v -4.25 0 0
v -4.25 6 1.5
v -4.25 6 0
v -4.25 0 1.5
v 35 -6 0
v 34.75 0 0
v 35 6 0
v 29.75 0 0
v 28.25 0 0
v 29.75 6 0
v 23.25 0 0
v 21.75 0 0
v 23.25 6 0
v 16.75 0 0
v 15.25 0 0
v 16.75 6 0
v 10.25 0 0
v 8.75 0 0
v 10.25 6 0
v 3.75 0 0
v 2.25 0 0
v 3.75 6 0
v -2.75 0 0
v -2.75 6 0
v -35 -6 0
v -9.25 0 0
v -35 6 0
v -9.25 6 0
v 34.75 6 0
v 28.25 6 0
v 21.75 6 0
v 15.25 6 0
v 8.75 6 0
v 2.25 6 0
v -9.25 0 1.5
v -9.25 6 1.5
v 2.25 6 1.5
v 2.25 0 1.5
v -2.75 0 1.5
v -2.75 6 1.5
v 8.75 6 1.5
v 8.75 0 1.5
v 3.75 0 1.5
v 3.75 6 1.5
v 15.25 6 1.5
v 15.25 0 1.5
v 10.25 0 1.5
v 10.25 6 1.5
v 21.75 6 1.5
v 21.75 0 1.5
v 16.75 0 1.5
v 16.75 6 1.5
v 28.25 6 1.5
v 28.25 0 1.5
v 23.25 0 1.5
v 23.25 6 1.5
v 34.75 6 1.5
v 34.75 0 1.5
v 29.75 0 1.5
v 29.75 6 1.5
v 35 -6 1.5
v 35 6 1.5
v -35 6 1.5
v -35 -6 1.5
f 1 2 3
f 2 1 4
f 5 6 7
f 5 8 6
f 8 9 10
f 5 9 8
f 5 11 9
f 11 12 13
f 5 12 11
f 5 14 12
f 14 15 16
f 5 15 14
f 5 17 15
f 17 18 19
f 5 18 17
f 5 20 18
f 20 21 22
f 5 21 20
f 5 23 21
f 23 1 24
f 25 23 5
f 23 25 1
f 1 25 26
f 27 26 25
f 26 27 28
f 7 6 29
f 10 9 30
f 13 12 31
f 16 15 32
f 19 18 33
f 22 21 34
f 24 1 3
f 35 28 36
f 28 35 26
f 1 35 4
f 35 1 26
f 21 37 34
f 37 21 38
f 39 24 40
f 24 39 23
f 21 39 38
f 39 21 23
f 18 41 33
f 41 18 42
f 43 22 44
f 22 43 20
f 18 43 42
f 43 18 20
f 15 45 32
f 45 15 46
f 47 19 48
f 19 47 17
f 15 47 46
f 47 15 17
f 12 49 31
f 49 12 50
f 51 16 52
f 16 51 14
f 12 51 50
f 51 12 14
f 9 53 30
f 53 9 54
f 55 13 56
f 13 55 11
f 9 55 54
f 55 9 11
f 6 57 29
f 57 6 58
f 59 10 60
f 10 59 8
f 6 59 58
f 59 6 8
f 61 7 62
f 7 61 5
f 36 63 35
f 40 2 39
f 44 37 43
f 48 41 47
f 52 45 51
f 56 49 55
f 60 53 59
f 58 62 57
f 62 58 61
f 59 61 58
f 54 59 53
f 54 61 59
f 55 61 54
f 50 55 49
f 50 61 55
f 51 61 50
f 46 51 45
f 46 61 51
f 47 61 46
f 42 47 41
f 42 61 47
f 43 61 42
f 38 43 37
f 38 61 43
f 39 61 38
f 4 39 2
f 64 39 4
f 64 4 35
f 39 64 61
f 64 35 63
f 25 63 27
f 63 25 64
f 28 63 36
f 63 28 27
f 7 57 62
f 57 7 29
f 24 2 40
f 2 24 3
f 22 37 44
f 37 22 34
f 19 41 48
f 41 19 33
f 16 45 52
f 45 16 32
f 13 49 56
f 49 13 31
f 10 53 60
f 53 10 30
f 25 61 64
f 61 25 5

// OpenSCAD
// 10-well comb for agarose gel casting
// Print orientation: flat on bed, teeth pointing down (-Z)

// ---- Dimensions (mm) ----
plate_t      = 1.5;    // plate thickness (Z)
spine_len    = 70;     // spine length (X)
spine_w      = 12;     // spine width (Y)
tooth_n      = 10;     // number of teeth
tooth_w      = 5.0;    // tooth width (X)
tooth_l      = 12;     // tooth length (Y)
gap          = 1.5;    // gap between teeth (X)
eps          = 0.5;    // cutter overshoot

$fn = 64;

pitch = tooth_w + gap;
x0    = -(tooth_n - 1) * gap / 2;   // first tooth centre offset

difference() {
    // Plate
    translate([-spine_len / 2, -spine_w / 2, 0])
        cube([spine_len, spine_w, plate_t]);

    // Teeth
    for (i = [0 : tooth_n - 1])
        translate([x0 + i * pitch - tooth_w / 2, 0, 0])
            cube([tooth_w, tooth_l, plate_t + 2 * eps]);
}
